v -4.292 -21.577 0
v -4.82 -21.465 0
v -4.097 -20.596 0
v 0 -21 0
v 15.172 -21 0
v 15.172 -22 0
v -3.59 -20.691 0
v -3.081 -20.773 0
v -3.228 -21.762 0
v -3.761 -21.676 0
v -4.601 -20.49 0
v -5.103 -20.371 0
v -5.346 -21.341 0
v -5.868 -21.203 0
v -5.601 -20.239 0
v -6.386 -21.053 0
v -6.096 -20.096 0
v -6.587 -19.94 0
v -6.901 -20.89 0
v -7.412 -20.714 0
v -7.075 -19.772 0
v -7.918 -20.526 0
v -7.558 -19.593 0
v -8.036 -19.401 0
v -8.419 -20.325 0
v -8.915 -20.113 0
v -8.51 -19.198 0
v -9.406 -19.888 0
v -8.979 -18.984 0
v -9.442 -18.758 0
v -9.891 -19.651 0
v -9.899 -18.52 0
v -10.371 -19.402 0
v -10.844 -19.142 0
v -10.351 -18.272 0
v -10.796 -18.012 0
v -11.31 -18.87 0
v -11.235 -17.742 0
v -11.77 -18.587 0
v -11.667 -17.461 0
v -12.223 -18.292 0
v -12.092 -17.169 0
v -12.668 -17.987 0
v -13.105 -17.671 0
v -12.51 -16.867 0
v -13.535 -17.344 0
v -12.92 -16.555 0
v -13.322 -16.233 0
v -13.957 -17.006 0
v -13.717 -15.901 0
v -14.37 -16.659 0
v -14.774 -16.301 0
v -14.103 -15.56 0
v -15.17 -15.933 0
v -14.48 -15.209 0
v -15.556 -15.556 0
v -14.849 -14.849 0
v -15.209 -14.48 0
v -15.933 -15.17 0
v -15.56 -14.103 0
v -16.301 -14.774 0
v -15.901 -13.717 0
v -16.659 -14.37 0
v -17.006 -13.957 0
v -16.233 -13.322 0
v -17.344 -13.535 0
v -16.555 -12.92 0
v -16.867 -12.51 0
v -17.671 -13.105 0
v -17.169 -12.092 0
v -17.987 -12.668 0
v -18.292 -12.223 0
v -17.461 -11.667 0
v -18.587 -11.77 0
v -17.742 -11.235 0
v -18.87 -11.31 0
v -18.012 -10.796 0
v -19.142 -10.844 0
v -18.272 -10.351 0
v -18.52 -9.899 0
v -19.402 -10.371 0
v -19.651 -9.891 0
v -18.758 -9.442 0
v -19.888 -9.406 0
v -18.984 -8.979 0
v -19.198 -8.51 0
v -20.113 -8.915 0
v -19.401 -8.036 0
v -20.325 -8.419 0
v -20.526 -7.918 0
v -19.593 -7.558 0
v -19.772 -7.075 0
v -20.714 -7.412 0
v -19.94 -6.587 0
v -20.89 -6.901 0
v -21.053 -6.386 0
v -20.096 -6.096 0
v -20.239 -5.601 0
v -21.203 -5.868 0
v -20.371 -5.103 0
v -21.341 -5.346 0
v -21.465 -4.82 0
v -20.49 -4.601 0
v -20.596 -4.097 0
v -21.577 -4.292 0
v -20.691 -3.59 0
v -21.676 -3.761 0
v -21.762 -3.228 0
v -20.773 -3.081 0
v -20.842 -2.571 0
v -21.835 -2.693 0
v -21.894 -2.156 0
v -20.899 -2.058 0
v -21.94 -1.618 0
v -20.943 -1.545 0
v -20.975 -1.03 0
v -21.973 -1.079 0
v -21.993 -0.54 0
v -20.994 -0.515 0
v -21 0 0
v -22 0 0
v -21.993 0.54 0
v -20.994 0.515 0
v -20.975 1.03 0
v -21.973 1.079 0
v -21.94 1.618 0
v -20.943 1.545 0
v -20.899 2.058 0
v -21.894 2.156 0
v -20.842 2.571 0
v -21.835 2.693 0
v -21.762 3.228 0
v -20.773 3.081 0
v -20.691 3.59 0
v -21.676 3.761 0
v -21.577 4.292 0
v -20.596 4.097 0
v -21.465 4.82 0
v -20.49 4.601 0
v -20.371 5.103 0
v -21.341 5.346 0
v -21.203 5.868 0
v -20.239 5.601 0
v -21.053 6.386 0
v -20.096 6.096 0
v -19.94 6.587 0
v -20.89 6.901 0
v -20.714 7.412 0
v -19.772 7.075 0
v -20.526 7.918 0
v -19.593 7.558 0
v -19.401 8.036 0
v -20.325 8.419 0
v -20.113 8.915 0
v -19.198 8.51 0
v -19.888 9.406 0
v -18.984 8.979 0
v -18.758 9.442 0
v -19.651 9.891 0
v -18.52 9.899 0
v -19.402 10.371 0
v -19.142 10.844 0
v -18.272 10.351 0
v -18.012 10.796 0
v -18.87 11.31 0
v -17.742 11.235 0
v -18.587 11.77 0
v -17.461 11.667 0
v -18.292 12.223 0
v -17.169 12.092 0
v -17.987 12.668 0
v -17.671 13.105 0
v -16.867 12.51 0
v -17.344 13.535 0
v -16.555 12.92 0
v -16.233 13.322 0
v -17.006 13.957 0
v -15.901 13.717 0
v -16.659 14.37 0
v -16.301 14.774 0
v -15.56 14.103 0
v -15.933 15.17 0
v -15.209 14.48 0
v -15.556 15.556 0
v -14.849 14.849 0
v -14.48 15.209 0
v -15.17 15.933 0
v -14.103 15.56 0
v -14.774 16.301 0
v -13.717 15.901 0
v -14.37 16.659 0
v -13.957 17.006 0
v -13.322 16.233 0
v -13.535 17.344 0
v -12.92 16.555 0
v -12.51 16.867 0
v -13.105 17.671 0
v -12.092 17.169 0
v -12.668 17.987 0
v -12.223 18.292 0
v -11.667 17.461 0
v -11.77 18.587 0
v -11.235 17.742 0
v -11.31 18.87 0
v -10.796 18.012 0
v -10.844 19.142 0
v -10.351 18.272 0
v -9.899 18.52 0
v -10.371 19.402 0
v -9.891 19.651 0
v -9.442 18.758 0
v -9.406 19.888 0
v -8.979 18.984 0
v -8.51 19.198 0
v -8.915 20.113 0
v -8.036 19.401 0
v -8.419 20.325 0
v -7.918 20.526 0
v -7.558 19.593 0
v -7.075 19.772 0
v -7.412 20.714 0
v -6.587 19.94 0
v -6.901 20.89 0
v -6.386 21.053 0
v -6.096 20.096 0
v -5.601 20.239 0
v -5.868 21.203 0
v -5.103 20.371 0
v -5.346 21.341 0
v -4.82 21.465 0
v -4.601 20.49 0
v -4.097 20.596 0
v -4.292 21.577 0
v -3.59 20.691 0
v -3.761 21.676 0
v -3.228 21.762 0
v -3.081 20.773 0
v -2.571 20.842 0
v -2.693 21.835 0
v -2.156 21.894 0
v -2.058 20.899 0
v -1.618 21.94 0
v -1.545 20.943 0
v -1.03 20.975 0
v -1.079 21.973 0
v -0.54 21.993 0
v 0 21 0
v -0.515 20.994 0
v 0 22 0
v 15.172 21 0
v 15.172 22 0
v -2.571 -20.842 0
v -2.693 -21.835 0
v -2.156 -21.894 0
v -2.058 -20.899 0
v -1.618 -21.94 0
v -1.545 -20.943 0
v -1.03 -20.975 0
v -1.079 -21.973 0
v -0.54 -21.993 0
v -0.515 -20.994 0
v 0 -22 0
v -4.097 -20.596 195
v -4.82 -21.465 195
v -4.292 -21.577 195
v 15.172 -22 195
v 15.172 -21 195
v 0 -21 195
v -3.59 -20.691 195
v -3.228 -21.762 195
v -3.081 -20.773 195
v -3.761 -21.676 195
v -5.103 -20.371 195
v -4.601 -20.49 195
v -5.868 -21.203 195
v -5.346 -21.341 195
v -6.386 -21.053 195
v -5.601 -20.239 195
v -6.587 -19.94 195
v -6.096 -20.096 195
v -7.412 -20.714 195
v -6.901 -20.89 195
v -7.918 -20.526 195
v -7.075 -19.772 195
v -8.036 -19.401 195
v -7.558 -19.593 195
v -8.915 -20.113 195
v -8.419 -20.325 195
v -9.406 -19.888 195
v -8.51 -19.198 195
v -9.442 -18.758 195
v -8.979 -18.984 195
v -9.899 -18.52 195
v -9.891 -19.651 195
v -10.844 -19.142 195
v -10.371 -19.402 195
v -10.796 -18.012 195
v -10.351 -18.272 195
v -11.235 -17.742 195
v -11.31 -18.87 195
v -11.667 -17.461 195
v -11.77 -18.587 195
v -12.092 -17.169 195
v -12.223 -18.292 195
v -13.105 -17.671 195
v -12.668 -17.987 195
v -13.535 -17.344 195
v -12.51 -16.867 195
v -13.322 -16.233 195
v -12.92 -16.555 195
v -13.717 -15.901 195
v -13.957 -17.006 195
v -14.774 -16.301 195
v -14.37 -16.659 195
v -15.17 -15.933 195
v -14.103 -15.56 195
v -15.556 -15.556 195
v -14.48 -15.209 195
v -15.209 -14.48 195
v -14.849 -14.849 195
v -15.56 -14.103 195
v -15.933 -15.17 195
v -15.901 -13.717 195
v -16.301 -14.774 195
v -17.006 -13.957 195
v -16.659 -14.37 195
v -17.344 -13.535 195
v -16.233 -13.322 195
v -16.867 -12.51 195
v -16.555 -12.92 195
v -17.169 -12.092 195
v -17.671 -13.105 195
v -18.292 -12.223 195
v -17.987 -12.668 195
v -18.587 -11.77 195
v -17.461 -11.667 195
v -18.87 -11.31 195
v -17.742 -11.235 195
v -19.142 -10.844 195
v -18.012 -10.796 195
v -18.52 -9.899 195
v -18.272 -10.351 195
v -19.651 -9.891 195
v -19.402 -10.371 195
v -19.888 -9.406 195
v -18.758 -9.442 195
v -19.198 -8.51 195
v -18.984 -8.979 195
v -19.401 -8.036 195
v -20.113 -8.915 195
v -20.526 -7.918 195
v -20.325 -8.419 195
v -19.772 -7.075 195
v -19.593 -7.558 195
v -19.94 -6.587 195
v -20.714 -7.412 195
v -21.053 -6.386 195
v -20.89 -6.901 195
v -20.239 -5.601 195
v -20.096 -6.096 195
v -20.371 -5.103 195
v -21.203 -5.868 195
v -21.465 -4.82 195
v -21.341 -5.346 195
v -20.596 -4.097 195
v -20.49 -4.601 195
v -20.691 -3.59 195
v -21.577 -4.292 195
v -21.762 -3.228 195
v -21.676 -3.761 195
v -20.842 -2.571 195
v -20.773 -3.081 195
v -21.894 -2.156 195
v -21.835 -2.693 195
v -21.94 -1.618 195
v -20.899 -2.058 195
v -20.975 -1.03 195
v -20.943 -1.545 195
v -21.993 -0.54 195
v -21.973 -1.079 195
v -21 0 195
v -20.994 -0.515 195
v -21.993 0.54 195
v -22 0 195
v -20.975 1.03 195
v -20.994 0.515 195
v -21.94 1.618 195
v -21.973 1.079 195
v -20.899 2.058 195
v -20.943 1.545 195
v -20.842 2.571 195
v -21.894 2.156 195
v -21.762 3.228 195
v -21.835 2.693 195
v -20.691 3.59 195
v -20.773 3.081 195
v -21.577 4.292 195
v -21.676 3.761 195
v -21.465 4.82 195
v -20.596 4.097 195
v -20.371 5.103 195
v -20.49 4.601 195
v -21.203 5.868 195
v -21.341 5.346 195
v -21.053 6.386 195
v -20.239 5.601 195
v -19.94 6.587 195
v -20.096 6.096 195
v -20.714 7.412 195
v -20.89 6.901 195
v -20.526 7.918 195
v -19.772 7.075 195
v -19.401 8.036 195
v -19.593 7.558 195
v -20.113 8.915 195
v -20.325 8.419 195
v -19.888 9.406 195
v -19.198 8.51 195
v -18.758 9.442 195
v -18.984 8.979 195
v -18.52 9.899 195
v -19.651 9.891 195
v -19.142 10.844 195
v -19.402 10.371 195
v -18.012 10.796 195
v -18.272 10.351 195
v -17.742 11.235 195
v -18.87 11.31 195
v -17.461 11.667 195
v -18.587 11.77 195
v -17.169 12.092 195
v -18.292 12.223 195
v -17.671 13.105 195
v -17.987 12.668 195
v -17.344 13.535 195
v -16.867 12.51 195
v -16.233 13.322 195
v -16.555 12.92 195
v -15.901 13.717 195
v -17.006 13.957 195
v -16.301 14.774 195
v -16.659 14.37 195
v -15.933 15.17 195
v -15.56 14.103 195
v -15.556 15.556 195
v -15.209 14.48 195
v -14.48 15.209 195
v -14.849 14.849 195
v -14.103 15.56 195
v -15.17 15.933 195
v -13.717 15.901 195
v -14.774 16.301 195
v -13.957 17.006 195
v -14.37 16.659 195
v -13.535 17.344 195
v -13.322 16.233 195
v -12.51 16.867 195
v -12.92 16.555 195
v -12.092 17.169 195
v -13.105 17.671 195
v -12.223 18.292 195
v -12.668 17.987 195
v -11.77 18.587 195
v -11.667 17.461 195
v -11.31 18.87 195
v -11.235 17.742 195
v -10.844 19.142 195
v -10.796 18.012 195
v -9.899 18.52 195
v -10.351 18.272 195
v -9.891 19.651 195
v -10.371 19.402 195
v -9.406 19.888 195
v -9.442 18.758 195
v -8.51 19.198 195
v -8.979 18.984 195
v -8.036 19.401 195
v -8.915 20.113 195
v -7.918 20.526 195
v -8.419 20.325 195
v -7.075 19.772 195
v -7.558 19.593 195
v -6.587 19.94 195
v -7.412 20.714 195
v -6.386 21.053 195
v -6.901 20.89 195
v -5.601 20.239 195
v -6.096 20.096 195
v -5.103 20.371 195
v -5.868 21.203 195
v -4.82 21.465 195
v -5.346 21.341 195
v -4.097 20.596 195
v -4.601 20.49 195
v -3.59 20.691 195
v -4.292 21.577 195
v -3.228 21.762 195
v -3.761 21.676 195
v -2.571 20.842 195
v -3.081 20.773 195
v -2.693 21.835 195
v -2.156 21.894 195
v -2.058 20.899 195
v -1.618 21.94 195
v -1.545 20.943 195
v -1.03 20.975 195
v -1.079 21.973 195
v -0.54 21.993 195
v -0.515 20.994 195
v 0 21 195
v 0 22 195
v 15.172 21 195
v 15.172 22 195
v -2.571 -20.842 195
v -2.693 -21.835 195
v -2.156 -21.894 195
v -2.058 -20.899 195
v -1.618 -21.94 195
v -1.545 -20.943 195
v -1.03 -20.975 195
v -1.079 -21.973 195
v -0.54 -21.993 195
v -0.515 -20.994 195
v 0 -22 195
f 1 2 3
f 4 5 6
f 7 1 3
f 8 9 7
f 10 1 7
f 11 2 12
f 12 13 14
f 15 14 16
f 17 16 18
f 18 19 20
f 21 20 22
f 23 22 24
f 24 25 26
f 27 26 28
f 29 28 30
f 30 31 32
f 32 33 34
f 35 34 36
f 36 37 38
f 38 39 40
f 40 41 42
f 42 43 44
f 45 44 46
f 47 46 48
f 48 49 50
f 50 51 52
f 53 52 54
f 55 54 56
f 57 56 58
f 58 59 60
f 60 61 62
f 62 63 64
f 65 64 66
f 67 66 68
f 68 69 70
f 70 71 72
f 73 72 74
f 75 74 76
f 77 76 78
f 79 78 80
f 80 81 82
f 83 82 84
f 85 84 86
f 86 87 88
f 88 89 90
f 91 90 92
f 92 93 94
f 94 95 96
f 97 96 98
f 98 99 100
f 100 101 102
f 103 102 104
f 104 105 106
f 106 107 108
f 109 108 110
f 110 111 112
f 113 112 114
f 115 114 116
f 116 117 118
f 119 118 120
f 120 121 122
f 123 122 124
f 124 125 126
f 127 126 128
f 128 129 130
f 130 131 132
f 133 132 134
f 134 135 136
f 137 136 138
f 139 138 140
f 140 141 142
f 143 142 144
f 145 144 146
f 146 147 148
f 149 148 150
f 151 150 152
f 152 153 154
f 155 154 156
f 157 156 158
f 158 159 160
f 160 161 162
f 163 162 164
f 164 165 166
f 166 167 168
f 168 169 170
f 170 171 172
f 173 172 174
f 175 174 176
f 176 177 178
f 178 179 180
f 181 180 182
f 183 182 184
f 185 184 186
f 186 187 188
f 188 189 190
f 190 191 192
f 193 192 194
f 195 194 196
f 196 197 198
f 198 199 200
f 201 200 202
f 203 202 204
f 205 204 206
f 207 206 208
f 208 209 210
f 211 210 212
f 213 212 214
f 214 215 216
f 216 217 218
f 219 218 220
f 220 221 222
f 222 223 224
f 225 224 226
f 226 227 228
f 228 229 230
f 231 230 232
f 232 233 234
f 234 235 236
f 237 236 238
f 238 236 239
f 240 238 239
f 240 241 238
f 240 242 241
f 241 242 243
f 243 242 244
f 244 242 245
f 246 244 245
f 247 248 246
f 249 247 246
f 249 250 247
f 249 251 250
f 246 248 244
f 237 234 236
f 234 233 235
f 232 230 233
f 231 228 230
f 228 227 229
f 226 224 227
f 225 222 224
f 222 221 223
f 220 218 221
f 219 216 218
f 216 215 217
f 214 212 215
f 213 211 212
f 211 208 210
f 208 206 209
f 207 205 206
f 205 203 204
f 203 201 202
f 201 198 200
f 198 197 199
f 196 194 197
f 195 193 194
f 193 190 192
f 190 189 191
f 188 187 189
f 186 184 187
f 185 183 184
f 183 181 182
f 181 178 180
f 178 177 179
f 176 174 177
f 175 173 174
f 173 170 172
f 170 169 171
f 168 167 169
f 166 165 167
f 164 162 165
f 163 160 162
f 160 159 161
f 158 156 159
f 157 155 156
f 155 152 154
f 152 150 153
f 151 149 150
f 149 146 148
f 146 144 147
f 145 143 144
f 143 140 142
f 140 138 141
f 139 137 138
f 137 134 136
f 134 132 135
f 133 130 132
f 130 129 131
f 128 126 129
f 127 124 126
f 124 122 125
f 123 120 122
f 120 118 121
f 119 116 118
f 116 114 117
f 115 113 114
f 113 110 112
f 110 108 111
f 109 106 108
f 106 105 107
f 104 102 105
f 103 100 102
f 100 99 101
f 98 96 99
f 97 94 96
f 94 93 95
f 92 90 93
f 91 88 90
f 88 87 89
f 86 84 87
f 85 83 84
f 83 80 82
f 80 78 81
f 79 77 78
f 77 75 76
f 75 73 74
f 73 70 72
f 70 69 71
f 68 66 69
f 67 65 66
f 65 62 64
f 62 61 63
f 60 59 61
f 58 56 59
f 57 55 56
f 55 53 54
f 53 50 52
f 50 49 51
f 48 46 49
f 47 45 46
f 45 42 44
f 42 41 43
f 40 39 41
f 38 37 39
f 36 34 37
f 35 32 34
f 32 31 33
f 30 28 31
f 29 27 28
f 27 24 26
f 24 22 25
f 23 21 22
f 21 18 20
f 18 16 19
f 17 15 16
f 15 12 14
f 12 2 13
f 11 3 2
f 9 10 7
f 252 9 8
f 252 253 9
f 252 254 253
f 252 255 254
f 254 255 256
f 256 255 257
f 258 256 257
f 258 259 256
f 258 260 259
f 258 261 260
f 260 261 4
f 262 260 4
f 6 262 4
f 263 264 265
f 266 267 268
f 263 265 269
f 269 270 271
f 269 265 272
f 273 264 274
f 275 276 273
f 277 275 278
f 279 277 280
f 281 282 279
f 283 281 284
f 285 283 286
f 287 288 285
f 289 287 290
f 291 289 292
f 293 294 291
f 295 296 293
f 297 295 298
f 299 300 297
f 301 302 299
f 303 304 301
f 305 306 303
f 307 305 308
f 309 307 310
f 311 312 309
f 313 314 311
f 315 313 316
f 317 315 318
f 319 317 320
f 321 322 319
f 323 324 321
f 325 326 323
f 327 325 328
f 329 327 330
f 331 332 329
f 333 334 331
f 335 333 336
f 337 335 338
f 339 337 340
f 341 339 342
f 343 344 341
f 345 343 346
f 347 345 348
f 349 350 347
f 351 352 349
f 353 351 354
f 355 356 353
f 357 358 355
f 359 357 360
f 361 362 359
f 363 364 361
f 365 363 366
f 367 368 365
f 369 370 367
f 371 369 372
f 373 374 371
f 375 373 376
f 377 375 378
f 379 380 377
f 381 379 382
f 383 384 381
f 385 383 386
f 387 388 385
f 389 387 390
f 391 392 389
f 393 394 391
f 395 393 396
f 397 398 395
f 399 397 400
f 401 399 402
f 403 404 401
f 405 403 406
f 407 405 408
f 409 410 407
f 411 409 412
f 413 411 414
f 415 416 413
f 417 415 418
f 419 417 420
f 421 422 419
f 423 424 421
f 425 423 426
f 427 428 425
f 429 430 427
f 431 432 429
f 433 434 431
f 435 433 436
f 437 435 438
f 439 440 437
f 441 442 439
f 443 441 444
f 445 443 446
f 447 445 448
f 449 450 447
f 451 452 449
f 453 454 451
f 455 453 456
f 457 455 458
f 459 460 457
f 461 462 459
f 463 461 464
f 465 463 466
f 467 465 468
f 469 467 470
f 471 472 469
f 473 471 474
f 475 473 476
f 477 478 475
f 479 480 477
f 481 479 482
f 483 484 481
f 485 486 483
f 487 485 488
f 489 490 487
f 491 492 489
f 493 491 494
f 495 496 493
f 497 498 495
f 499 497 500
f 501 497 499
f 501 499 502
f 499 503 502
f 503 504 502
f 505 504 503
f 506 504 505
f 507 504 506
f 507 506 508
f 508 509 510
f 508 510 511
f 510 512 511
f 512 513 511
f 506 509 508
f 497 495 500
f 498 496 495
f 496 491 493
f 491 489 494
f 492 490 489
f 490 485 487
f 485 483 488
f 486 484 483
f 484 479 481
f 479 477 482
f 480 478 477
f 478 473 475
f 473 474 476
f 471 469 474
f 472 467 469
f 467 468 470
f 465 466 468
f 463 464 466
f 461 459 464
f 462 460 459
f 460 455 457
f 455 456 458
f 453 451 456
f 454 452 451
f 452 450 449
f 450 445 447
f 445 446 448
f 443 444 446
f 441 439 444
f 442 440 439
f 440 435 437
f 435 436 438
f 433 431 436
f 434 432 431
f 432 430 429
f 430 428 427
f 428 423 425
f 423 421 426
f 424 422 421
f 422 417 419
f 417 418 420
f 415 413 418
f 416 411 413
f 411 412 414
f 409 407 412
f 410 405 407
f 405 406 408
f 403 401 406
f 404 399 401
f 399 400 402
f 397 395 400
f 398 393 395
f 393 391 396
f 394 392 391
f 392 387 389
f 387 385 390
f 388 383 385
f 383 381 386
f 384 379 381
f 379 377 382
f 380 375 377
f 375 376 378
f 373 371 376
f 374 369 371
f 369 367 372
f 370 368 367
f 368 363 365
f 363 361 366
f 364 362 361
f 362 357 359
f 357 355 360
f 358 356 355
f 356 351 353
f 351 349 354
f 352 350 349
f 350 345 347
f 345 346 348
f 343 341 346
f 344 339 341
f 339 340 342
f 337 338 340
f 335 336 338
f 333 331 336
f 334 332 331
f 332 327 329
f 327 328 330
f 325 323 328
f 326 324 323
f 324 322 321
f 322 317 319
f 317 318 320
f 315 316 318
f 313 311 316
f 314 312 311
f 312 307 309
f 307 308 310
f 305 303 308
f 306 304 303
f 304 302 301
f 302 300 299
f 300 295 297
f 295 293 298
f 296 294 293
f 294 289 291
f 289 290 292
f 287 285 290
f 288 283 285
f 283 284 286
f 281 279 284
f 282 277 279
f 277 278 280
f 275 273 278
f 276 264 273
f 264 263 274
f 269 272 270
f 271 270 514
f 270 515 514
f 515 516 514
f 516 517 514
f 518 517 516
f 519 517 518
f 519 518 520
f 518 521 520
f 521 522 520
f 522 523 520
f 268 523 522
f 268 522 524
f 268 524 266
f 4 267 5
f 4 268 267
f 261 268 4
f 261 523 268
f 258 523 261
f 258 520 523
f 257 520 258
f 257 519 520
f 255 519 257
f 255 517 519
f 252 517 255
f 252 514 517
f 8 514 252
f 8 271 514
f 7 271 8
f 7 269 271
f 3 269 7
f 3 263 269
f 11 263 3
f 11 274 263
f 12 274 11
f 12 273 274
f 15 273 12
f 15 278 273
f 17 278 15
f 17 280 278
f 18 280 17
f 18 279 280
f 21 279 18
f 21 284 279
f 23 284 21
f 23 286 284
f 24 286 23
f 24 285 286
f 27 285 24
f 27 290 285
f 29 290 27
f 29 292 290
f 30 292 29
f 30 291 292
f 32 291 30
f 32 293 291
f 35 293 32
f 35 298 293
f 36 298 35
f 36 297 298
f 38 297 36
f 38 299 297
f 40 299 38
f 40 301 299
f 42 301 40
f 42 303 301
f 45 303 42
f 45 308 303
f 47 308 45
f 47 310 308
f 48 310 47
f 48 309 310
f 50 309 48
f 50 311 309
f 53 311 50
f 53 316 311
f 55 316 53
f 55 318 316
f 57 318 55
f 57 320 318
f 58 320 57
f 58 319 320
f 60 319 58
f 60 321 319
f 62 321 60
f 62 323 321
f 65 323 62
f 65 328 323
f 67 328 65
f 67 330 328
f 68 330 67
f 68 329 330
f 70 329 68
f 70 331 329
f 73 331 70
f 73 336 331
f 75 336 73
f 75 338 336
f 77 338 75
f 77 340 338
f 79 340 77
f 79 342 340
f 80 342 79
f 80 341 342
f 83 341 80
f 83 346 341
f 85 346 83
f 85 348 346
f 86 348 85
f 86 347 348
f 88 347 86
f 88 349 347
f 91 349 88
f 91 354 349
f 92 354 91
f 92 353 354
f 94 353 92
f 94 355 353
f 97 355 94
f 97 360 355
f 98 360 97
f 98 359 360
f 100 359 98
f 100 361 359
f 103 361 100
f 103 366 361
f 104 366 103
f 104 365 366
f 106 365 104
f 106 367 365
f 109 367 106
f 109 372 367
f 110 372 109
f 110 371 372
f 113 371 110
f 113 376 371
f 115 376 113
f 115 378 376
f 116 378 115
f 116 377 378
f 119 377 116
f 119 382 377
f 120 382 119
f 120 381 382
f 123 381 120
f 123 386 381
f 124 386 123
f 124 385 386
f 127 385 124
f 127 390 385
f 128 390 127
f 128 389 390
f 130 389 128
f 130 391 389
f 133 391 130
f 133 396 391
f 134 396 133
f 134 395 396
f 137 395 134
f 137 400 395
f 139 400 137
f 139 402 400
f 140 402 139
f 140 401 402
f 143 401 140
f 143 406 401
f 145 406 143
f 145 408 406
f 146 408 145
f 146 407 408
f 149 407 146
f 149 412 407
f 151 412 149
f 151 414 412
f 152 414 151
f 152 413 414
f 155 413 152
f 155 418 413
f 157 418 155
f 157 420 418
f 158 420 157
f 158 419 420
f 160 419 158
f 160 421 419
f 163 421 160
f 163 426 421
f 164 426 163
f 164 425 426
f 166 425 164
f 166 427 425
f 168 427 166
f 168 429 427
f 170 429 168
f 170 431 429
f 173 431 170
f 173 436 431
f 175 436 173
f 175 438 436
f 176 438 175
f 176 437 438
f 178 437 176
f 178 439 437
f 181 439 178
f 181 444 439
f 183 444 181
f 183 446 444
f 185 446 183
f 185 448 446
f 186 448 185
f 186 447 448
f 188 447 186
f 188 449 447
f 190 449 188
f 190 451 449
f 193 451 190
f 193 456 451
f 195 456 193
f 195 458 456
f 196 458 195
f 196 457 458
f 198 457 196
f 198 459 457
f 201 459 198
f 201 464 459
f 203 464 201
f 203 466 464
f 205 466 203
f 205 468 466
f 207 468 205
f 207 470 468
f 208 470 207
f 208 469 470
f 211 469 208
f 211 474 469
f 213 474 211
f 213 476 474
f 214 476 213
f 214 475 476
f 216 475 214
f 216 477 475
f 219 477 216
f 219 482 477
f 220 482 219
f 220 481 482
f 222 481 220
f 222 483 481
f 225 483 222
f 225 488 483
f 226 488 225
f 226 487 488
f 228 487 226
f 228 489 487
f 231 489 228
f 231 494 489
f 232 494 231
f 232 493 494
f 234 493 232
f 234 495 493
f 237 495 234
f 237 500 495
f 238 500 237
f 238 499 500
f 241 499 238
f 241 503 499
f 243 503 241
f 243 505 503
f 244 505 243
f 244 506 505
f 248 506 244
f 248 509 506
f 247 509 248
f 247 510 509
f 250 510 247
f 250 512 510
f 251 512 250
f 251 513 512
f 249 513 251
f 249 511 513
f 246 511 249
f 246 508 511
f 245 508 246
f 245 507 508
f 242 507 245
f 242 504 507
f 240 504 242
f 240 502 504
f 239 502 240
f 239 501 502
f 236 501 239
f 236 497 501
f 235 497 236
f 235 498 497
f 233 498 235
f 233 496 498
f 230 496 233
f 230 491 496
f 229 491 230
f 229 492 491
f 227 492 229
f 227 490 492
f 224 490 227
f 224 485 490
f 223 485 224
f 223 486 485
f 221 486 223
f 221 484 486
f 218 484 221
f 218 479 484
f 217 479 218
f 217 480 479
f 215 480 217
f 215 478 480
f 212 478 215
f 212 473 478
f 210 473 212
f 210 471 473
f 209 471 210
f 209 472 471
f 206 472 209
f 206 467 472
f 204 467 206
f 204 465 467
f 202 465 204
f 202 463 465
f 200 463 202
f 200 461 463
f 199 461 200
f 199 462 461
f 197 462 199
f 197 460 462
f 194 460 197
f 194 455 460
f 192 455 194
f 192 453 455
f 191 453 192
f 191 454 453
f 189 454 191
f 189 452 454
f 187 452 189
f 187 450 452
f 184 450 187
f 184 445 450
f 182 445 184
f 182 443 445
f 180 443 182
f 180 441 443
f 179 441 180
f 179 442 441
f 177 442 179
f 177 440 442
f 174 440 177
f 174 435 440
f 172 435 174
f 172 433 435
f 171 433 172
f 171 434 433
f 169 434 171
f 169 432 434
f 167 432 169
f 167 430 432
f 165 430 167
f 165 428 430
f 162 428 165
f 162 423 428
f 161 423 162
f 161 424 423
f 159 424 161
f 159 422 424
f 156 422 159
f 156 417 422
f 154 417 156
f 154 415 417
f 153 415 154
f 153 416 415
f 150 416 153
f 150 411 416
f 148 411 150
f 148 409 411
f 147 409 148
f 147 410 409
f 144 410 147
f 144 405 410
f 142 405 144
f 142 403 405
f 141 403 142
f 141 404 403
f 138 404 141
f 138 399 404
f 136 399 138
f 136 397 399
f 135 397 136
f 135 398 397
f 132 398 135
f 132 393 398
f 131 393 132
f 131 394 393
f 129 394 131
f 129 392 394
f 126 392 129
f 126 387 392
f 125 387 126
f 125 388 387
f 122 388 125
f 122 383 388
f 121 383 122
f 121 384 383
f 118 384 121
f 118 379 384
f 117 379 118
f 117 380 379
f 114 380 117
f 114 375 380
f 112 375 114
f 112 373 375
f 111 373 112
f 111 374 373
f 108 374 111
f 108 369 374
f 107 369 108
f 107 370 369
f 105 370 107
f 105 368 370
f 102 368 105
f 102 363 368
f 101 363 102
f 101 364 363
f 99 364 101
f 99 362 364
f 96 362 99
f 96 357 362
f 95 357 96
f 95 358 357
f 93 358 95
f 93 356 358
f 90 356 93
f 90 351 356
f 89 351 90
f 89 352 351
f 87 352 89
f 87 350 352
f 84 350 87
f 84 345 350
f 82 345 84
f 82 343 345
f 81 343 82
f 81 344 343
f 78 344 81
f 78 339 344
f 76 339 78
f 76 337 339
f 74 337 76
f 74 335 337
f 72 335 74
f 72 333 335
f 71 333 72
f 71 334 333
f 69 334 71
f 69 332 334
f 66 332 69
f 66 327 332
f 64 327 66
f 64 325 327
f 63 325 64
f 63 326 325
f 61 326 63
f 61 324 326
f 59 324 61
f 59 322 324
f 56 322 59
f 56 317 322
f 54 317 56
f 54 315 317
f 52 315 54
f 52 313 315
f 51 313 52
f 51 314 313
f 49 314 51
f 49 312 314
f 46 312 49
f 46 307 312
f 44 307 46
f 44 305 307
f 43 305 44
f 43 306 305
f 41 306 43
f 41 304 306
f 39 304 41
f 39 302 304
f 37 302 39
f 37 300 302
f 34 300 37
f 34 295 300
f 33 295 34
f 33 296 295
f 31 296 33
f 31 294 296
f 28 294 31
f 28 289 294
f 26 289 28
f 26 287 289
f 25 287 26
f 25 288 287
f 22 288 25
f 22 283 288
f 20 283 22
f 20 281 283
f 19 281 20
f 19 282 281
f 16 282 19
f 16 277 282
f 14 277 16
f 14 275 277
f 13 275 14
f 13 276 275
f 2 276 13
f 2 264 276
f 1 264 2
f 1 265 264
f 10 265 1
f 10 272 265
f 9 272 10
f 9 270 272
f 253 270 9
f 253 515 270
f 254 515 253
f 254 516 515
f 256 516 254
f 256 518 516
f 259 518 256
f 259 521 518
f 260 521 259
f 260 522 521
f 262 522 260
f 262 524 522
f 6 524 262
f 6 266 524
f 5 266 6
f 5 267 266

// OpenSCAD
$fn=$preview ? 64 : 256;

dia=44;
skall=2;
var=2.9;
h=15;
feste_h=3.5;
feste_b=7;

module dings(di, dy) {
    difference() {
        circle(d=di);
        translate([0,-di/2]) {
            square([di,di]);
        }
    }
    translate([0,-di/2]) {
        square([dy,di]);
    }
}

module skjerm(h) {
    linear_extrude(h) {
        difference() {
            dings(di=dia, dy=dia/var);
            dings(di=dia-skall, dy=dia/var);
        }
    }
}

module feste_hunn(di,sk,h,b) {
    difference() 
    {
        skjerm(feste_h);
        translate([0,di/2-sk/4*3,0]) {
            cube([b,sk,h]);
        }
        translate([b/4,-di/2-sk/4,0]) {
            cube([b,sk,h]);
        }
        translate([-di/2,-b/2,0]) {
            cube([sk,b,h]);
        }
    }
}

module feste_hann(di,sk,h,b) {
    difference() {
        skjerm(h);
        feste_hunn(di,sk,h,b);
    }
}

module midt(h=h) {
    feste_hunn(dia, skall, feste_h, feste_b);
    translate([0,0,feste_h]) {
        skjerm(h);
        translate([0,0,h]) {
            feste_hann(dia, skall, feste_h, feste_b);
        }
    }
}

module hannkant(h=h) {
    skjerm(h);
    translate([0,0,h]) {
        feste_hann(dia, skall, feste_h, feste_b);
    }
}

module hunnkant(h=h) {
    feste_hunn(dia, skall, feste_h, feste_b);
    translate([0,0,feste_h]) {
        skjerm(h);
    }
}

//hannkant(h=150);
skjerm(h=195);
